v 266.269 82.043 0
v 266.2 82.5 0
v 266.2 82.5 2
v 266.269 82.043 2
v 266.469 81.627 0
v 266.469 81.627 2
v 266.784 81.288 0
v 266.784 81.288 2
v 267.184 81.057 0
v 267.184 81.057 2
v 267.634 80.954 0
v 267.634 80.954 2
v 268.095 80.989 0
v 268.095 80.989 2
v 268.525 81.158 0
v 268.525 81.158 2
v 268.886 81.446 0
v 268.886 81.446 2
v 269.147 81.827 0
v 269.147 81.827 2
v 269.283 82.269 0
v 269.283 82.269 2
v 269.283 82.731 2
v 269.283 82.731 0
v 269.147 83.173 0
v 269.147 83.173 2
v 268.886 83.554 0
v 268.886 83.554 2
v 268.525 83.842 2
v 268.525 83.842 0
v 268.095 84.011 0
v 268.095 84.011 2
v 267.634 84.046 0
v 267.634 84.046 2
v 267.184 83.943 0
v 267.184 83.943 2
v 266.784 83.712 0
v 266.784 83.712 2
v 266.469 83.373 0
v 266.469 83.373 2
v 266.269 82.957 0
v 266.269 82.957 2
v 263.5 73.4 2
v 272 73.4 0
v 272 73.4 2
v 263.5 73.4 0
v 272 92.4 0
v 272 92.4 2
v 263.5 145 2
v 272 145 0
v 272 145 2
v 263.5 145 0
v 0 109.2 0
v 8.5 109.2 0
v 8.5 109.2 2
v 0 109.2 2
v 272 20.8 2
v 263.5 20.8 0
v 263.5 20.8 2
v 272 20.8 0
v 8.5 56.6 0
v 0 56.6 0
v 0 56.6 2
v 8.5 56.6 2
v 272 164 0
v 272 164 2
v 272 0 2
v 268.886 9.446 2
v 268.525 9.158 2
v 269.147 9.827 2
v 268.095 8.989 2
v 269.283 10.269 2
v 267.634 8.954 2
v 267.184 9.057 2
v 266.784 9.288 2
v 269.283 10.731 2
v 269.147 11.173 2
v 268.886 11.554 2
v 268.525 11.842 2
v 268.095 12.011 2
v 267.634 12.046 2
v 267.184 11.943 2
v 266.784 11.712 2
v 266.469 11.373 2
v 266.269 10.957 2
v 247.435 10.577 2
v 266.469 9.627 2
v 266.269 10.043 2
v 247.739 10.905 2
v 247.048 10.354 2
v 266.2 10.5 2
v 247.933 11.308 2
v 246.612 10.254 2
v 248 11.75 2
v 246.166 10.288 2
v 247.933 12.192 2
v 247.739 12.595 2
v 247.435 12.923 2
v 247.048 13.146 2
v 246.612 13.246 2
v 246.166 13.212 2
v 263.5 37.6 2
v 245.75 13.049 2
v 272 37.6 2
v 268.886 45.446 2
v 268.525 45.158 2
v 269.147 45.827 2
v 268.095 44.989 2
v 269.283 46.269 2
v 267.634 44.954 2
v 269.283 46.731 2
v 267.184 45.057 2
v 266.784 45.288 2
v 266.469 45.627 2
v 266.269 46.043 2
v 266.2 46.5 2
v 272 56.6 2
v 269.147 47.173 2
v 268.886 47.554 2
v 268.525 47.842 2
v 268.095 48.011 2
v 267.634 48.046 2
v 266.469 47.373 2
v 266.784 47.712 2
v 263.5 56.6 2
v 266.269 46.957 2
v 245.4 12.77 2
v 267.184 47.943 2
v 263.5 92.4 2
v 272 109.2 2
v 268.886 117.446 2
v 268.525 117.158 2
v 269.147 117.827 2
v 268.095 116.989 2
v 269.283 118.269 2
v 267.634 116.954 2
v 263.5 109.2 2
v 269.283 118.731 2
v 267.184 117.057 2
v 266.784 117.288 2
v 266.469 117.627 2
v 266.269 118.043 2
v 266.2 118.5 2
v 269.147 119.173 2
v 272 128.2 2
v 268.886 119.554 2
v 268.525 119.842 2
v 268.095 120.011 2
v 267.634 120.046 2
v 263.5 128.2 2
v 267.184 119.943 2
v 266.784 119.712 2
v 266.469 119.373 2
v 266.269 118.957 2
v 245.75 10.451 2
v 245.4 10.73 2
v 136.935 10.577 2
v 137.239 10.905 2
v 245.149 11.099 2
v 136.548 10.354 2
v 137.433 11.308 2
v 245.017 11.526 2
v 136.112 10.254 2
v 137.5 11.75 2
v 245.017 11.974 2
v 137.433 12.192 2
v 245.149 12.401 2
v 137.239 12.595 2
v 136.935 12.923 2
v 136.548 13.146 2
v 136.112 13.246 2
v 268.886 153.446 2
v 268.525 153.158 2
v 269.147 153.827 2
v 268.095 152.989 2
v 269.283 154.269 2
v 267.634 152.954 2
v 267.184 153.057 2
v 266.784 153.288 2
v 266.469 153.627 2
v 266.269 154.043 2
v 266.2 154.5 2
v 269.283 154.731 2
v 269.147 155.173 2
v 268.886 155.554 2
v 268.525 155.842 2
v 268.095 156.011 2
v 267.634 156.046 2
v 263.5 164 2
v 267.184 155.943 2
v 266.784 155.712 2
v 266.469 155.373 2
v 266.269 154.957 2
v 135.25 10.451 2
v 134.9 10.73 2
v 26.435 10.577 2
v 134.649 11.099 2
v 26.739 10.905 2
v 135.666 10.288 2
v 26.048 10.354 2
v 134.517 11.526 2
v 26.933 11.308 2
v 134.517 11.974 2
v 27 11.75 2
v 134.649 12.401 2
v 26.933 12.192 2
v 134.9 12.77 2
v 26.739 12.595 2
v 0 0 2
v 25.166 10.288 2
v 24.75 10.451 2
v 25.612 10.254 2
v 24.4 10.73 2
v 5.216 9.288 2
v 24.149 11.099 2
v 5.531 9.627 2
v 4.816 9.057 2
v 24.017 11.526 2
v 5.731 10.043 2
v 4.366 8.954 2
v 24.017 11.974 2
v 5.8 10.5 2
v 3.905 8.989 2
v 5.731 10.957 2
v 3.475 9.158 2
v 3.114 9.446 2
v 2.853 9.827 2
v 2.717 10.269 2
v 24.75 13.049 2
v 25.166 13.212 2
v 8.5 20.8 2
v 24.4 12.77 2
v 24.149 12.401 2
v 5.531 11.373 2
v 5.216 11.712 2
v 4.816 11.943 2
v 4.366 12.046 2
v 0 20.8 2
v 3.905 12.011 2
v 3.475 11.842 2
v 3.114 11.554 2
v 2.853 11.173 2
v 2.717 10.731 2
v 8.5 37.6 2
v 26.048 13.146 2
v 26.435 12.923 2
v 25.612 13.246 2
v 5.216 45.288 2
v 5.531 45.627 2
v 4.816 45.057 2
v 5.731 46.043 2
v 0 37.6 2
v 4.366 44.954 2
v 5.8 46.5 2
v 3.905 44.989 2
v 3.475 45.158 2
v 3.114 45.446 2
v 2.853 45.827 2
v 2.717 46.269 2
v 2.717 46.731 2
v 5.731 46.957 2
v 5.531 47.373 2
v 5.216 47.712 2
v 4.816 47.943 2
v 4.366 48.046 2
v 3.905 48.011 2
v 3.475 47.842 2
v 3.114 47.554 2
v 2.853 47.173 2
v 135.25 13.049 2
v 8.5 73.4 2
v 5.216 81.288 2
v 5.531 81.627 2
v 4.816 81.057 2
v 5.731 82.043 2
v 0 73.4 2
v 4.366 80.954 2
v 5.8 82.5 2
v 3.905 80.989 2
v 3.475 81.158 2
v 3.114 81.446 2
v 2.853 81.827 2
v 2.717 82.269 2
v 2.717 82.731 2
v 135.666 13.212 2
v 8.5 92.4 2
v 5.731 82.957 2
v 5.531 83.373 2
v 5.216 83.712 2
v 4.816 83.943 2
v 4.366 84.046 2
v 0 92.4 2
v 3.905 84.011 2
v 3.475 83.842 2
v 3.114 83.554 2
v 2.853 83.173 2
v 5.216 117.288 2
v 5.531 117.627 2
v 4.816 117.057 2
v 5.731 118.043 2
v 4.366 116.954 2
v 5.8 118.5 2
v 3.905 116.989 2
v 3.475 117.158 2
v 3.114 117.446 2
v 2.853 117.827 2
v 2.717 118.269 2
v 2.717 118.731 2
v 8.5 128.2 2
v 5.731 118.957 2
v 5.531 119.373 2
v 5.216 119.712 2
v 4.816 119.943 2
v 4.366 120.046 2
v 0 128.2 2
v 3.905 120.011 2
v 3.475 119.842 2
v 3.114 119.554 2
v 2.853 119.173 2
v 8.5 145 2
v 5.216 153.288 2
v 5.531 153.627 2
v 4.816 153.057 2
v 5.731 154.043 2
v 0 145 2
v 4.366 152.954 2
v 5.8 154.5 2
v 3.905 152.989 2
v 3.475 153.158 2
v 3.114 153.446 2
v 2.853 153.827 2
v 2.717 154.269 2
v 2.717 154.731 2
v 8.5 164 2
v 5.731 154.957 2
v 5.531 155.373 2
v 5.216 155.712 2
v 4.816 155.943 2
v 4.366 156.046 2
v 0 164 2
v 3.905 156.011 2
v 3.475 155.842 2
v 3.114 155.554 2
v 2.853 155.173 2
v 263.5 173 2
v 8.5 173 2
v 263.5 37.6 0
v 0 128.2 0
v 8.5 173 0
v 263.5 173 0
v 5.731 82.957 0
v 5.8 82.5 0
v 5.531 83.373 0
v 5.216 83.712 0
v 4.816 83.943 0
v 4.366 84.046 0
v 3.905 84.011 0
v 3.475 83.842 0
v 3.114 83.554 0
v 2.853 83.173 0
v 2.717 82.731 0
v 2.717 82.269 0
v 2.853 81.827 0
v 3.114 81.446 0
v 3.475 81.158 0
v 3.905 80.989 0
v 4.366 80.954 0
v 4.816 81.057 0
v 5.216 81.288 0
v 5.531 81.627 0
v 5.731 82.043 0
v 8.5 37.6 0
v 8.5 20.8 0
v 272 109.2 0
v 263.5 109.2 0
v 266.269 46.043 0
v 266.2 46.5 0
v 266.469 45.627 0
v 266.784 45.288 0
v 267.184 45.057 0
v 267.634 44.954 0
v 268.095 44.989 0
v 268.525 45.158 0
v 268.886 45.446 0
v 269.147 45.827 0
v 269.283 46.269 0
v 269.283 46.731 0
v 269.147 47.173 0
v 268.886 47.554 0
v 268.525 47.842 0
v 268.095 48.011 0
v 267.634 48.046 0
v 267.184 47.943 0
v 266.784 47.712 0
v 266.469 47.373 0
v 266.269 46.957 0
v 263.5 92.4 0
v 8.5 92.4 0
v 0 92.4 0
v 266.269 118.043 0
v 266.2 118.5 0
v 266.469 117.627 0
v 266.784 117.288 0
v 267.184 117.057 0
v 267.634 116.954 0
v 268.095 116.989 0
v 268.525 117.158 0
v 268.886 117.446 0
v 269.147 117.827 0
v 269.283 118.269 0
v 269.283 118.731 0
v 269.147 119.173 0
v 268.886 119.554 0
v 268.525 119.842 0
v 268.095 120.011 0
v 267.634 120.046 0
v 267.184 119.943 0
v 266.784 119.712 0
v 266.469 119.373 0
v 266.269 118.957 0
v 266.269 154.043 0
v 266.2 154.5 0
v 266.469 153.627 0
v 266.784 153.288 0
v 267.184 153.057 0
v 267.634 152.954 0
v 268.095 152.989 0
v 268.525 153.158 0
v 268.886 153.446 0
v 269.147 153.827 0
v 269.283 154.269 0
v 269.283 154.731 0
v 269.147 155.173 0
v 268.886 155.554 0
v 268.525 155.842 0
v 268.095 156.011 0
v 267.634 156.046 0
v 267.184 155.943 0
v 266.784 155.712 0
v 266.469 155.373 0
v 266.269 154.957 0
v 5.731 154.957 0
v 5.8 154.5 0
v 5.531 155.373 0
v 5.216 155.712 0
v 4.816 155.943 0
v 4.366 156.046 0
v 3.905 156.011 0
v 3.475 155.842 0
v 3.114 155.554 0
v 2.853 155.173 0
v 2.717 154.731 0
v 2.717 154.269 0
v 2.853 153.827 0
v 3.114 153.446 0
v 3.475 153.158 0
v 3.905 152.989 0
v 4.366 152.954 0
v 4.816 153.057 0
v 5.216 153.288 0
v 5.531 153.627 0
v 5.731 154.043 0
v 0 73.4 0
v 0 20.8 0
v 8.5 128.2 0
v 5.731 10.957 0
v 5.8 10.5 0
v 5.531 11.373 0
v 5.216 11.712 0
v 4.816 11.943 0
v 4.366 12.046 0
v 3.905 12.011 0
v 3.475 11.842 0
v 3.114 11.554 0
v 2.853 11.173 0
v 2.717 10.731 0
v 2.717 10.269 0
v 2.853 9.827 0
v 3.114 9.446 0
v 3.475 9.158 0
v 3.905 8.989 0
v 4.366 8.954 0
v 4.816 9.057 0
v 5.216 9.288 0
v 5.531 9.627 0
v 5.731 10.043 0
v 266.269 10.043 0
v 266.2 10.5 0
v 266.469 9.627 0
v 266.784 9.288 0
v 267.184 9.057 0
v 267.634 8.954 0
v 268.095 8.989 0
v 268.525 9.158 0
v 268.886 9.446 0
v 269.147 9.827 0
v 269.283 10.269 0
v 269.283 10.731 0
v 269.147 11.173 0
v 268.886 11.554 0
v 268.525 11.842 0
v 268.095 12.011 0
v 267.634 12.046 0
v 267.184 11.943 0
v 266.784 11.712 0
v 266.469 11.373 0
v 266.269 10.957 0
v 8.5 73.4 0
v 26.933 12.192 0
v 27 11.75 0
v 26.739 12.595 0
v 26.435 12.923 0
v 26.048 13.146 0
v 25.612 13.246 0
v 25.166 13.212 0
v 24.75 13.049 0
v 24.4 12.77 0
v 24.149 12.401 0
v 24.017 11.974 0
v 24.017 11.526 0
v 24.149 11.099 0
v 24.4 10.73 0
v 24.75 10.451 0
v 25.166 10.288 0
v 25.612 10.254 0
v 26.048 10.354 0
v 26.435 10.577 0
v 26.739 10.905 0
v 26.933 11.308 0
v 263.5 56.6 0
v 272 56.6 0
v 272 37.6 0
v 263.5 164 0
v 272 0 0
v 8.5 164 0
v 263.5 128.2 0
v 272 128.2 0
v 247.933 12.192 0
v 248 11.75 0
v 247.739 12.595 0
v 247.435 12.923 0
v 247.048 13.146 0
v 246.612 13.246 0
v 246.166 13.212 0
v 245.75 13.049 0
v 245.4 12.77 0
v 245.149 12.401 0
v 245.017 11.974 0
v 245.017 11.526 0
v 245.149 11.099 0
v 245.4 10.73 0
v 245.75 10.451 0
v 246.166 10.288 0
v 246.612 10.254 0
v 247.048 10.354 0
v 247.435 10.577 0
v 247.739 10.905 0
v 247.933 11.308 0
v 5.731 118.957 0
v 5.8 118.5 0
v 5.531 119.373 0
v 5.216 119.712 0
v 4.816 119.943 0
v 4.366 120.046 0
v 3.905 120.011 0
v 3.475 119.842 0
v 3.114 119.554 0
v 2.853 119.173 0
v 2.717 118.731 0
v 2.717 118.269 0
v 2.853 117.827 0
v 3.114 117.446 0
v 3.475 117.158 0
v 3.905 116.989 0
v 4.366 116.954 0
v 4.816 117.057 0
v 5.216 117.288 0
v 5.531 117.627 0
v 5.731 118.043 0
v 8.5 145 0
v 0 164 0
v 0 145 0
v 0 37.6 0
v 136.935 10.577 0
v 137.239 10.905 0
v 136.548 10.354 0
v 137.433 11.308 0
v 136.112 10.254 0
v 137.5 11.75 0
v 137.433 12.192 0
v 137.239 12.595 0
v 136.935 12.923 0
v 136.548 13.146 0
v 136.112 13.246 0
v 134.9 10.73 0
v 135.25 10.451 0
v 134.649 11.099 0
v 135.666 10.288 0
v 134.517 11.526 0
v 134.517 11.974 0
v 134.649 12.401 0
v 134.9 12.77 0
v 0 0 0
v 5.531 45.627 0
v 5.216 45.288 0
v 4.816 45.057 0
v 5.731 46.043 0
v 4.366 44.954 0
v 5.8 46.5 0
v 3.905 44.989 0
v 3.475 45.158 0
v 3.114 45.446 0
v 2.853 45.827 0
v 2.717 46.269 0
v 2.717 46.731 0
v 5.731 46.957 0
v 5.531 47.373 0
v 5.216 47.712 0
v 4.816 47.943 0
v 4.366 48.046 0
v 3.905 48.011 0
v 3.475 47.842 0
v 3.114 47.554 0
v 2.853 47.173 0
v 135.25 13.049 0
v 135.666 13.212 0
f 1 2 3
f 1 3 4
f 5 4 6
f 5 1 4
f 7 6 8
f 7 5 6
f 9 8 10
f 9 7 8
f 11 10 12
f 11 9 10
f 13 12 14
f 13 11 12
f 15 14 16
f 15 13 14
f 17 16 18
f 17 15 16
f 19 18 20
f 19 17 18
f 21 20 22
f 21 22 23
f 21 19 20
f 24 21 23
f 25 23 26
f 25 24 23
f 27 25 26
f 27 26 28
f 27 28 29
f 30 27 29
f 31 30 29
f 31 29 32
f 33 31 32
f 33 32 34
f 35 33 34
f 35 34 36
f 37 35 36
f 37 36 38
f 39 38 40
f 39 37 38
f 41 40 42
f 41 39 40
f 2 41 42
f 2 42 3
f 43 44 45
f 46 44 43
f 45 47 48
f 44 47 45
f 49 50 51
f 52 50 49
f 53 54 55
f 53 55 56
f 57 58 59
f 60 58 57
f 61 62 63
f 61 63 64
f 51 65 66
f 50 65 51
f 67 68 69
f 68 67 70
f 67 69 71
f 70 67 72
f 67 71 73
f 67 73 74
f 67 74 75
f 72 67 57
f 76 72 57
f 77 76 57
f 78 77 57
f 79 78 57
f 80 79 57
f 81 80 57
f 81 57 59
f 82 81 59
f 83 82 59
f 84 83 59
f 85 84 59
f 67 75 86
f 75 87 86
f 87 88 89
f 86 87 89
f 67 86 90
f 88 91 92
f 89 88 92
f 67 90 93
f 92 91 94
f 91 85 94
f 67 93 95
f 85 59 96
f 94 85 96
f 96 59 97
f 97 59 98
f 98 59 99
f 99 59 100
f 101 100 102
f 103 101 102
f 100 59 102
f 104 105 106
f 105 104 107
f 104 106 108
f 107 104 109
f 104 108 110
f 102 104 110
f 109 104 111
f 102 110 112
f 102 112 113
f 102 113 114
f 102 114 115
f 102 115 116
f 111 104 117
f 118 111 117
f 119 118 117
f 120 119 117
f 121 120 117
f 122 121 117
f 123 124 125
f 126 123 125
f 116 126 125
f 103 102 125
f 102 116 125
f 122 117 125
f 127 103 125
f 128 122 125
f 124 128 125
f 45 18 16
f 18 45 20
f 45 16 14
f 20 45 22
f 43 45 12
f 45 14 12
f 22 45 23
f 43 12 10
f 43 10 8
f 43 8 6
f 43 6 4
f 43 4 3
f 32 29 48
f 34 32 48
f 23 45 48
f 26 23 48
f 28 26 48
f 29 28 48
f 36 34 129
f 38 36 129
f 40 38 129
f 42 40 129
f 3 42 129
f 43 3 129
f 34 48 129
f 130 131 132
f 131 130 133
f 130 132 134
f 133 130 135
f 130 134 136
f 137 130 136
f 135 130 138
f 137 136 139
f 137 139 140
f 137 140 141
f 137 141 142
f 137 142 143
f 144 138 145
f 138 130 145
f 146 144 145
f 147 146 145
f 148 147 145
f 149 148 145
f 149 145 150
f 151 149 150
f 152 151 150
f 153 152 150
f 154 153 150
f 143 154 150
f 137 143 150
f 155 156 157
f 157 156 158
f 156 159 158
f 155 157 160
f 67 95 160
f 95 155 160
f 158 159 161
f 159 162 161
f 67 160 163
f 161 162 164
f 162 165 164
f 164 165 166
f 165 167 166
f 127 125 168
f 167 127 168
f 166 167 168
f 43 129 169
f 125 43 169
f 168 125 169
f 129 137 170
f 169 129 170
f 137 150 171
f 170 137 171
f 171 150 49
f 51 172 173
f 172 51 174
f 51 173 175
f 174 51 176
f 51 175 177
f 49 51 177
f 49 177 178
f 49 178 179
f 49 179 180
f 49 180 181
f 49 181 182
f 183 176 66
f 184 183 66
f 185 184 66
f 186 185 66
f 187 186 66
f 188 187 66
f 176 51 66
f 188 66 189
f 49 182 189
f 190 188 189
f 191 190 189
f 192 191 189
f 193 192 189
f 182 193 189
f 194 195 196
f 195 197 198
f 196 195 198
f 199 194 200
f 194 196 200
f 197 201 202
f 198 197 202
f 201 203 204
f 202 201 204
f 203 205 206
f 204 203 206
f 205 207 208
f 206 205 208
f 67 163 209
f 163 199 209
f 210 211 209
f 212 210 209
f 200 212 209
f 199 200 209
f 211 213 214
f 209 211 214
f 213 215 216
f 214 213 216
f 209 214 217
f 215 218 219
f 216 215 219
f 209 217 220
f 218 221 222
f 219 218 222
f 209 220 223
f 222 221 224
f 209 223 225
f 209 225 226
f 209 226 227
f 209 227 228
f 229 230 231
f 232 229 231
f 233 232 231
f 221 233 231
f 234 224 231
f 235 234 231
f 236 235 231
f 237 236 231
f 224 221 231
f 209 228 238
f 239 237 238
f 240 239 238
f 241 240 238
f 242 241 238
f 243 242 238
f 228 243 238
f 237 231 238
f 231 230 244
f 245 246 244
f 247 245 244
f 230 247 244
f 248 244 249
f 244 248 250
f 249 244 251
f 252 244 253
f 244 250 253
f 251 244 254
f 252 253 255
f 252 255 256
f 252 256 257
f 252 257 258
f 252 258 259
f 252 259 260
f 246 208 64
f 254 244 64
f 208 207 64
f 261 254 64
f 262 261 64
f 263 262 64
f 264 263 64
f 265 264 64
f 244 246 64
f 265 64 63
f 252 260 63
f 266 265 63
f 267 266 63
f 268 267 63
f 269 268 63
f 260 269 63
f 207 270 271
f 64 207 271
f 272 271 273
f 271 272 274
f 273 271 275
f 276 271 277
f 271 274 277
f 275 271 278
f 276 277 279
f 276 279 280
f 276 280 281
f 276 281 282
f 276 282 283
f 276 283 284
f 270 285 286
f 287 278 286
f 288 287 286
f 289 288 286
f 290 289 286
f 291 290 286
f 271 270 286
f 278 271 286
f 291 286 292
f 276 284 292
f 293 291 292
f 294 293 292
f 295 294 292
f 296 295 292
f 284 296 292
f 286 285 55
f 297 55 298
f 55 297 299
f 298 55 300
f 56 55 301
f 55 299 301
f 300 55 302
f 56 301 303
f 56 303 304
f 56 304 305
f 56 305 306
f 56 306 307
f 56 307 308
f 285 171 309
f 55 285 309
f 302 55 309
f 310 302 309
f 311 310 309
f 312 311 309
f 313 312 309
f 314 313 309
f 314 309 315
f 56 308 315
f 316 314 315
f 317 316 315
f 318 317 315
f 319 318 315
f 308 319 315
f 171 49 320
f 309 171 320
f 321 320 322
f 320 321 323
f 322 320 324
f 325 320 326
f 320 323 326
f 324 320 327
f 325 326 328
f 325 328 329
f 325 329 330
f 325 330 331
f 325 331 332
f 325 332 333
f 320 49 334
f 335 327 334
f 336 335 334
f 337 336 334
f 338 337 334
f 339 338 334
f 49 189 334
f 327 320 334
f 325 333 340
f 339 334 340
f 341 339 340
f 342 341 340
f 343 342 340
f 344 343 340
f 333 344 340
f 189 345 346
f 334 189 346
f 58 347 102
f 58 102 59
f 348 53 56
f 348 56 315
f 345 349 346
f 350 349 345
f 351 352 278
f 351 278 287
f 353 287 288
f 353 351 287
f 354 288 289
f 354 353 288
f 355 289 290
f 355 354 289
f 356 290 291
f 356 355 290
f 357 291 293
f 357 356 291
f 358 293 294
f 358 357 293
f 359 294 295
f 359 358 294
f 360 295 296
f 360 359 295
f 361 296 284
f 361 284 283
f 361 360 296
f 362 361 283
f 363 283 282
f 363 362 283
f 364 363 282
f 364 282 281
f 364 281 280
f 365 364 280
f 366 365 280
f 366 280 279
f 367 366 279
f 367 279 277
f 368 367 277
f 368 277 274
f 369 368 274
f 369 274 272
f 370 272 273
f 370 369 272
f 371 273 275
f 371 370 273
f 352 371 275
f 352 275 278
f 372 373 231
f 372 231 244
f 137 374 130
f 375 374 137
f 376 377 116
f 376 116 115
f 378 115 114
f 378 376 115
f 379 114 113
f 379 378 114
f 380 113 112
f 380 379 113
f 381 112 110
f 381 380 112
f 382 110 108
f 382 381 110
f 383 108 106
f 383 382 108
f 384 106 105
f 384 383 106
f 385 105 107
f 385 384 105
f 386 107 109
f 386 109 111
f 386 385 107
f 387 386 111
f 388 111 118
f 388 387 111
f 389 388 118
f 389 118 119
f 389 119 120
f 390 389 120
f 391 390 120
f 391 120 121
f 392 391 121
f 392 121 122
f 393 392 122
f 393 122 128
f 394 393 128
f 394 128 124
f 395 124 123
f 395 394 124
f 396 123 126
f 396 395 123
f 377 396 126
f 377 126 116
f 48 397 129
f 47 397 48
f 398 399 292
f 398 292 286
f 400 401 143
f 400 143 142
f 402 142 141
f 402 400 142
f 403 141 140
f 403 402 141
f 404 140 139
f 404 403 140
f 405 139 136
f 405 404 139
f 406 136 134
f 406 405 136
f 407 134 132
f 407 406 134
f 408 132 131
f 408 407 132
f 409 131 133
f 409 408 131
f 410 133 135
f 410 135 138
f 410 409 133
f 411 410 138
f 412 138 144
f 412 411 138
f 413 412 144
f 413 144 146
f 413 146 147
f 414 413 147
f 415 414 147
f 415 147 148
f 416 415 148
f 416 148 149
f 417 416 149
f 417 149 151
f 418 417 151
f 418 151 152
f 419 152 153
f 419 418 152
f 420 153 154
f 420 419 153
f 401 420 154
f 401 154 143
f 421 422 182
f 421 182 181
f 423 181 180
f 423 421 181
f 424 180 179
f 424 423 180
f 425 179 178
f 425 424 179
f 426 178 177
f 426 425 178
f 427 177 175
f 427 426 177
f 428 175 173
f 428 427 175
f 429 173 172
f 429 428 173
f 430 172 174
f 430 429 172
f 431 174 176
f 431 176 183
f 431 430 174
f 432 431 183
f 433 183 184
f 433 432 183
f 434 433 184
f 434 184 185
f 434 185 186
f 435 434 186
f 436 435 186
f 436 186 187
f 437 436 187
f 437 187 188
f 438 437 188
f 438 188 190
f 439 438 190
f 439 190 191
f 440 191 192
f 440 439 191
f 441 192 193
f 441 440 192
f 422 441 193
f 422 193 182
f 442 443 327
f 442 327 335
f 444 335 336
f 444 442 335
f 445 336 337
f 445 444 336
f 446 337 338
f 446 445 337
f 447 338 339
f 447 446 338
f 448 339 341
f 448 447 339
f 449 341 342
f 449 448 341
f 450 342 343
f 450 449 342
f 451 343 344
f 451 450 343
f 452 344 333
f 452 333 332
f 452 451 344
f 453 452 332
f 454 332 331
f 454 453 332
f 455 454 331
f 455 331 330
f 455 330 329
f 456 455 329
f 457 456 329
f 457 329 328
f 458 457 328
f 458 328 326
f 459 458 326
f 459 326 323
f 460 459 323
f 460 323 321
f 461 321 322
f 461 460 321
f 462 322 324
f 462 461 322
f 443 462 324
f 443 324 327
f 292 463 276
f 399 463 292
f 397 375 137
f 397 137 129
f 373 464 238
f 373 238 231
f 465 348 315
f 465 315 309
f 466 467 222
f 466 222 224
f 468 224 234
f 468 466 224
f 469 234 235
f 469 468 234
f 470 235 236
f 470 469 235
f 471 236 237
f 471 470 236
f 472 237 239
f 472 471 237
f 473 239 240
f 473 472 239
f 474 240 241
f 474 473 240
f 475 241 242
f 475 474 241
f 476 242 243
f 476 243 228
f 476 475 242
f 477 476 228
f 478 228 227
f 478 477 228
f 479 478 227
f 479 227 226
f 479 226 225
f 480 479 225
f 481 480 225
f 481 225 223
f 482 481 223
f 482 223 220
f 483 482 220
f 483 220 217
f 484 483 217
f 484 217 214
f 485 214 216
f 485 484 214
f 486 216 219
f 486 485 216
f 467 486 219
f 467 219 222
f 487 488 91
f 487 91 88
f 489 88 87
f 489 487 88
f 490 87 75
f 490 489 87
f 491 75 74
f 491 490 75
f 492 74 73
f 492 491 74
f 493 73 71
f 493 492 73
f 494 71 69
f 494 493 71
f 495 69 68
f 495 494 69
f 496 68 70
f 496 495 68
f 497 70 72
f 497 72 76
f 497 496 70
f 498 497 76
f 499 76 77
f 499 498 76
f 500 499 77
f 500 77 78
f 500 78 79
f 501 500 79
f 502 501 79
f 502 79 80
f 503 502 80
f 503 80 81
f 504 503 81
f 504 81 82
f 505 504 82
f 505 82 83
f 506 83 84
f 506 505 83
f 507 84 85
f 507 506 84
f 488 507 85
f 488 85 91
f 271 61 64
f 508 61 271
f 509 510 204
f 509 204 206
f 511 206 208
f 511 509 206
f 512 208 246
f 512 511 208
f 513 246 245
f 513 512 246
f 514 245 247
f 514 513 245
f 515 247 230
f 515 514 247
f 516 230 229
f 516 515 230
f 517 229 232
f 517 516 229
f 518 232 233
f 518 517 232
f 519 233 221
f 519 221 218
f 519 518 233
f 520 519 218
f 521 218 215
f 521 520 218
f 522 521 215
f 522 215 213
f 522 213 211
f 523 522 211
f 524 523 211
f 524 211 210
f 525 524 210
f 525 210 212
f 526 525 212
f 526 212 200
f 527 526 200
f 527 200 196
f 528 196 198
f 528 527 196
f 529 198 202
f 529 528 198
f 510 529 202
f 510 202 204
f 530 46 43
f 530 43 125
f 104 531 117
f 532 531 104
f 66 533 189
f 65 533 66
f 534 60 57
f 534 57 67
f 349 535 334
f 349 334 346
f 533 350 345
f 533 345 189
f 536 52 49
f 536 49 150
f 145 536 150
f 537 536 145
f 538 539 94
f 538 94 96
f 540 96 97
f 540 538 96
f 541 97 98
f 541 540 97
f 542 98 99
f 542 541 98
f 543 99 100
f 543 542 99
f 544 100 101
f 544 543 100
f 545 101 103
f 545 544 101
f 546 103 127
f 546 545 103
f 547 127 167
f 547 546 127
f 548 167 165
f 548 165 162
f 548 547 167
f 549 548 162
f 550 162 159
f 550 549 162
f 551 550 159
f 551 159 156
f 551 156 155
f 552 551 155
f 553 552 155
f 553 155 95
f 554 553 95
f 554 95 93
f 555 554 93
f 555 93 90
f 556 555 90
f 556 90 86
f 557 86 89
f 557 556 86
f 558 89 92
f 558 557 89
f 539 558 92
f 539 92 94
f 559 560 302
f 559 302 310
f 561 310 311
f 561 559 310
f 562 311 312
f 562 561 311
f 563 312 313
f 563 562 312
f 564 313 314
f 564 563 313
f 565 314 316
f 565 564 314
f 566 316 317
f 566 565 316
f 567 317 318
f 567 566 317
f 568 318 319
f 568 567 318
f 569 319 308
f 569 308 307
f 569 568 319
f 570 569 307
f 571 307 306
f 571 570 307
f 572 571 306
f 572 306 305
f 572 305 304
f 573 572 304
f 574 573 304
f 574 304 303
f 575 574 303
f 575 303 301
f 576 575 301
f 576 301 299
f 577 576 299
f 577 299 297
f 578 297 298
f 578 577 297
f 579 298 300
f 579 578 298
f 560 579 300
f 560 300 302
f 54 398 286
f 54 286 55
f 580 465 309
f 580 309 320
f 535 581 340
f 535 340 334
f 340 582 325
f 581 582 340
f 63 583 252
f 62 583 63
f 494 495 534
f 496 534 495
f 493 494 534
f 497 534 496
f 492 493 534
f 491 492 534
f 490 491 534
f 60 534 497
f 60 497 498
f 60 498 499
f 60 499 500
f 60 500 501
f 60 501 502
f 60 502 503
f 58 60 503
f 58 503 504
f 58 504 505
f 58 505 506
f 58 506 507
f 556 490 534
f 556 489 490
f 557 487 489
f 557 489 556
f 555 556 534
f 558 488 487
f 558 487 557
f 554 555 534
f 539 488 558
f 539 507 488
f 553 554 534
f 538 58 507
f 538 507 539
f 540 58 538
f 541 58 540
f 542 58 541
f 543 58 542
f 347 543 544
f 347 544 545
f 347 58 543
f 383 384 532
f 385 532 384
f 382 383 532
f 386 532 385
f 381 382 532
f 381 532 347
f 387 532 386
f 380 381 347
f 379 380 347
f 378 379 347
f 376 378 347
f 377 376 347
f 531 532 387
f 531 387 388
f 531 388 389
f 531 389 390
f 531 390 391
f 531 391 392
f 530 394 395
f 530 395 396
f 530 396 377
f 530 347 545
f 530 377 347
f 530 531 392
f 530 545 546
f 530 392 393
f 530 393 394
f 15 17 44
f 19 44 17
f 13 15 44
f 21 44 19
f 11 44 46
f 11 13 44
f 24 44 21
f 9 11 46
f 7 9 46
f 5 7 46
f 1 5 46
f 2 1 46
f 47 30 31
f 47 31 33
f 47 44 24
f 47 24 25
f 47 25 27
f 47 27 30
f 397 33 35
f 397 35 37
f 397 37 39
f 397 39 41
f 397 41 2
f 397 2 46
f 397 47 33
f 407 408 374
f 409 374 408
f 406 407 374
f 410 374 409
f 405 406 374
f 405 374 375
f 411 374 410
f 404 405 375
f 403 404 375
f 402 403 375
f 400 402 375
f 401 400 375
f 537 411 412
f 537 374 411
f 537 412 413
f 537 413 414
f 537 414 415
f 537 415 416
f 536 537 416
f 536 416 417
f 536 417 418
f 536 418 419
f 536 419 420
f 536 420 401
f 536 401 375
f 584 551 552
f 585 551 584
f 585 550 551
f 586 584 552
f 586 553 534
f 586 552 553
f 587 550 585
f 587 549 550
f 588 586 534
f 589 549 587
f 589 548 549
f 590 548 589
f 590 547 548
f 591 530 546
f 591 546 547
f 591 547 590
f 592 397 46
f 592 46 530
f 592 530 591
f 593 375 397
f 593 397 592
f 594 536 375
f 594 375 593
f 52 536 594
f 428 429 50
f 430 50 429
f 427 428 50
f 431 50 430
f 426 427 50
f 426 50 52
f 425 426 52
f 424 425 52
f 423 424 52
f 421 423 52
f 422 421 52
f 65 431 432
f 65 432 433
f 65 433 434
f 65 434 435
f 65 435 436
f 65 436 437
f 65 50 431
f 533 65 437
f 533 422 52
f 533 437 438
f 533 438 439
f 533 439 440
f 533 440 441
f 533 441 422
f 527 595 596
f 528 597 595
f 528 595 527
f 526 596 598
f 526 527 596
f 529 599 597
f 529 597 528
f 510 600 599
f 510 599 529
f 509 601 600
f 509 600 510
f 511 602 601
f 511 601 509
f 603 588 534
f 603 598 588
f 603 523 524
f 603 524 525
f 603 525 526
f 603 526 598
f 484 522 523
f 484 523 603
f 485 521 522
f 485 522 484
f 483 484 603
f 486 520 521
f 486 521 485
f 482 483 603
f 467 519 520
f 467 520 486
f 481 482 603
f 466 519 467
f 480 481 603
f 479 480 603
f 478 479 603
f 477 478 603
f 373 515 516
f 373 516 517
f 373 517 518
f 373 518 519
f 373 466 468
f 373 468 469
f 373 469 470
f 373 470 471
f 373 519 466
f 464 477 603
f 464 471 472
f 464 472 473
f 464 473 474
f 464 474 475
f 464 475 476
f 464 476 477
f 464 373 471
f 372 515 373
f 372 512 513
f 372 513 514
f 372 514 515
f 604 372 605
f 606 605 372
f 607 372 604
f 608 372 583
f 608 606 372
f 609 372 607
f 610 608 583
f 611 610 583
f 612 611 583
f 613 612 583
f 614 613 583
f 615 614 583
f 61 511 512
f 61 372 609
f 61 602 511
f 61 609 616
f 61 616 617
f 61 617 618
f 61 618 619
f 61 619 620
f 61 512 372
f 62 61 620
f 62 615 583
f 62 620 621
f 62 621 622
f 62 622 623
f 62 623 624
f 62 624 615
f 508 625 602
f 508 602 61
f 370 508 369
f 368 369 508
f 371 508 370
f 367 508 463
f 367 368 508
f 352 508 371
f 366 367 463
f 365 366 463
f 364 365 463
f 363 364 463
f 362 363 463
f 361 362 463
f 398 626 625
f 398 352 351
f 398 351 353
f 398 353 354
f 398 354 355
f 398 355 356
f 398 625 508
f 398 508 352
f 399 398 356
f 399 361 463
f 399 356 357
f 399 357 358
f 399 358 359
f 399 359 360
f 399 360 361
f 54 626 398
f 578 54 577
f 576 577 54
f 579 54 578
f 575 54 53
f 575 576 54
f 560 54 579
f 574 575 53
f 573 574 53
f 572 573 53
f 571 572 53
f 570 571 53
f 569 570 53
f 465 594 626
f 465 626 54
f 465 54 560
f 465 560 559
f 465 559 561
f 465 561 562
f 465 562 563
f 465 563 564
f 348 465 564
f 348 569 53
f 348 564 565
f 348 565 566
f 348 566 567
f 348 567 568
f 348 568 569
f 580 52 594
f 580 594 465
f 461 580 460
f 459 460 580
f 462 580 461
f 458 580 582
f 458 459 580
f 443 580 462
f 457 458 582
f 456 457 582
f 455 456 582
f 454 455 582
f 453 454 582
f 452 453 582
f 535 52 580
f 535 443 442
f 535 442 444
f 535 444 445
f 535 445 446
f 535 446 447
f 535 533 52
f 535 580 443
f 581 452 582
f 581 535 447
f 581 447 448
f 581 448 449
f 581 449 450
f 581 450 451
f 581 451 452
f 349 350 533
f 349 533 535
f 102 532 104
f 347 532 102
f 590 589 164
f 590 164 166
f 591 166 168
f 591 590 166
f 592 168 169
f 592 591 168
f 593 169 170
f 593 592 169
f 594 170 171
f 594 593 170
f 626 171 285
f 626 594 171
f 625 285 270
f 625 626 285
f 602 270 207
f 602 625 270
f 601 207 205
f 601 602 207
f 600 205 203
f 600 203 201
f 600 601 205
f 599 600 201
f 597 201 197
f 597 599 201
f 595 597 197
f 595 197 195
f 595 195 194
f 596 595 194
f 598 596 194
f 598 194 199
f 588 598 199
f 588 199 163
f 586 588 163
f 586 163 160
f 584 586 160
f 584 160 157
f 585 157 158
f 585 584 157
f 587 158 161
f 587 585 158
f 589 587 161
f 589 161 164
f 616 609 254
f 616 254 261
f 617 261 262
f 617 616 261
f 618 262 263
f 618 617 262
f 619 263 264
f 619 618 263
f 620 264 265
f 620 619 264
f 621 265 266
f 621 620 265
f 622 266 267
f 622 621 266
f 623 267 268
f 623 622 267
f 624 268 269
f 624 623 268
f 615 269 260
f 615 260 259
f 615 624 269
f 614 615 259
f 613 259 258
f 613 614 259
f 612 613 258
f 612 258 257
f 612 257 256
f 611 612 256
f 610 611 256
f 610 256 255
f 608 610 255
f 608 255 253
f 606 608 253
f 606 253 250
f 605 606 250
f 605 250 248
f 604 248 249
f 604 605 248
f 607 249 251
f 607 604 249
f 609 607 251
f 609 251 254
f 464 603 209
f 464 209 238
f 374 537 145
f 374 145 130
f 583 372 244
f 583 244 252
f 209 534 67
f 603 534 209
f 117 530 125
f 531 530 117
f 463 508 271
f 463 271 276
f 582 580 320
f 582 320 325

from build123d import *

# Parameters (mm, degrees)
SKETCH1_R           = 1.55
SKETCH1_R_2         = 1.5
BOSS_EXTRUDE1_DEPTH = 2


with BuildPart() as part:
    # Sketch1 → Boss-Extrude1 (new body)
    with BuildSketch(Plane.XY):
        Polygon((0, 20.8), (8.5, 20.8), (8.5, 37.6), (0, 37.6), (0, 56.6), (8.5, 56.6), (8.5, 73.4), (0, 73.4), (0, 92.4), (8.5, 92.4), (8.5, 109.2), (0, 109.2), (0, 128.2), (8.5, 128.2), (8.5, 145), (0, 145), (0, 164), (8.5, 164), (8.5, 173), (263.5, 173), (263.5, 164), (272, 164), (272, 145), (263.5, 145), (263.5, 128.2), (272, 128.2), (272, 109.2), (263.5, 109.2), (263.5, 92.4), (272, 92.4), (272, 73.4), (263.5, 73.4), (263.5, 56.6), (272, 56.6), (272, 37.6), (263.5, 37.6), (263.5, 20.8), (272, 20.8), (272, 0), (0, 0), align=None)
        with Locations((4.25, 154.5)):
            Circle(SKETCH1_R, mode=Mode.SUBTRACT)
        with Locations((4.25, 118.5)):
            Circle(SKETCH1_R, mode=Mode.SUBTRACT)
        with Locations((4.25, 82.5)):
            Circle(SKETCH1_R, mode=Mode.SUBTRACT)
        with Locations((4.25, 46.5)):
            Circle(SKETCH1_R, mode=Mode.SUBTRACT)
        with Locations((4.25, 10.5)):
            Circle(SKETCH1_R, mode=Mode.SUBTRACT)
        with Locations(Location((267.75, 10.5, 0), (0, 0, 180))):
            Circle(SKETCH1_R, mode=Mode.SUBTRACT)
        with Locations(Location((267.75, 46.5, 0), (0, 0, 180))):
            Circle(SKETCH1_R, mode=Mode.SUBTRACT)
        with Locations(Location((267.75, 82.5, 0), (0, 0, 180))):
            Circle(SKETCH1_R, mode=Mode.SUBTRACT)
        with Locations(Location((267.75, 118.5, 0), (0, 0, 180))):
            Circle(SKETCH1_R, mode=Mode.SUBTRACT)
        with Locations(Location((267.75, 154.5, 0), (0, 0, 180))):
            Circle(SKETCH1_R, mode=Mode.SUBTRACT)
        with Locations((25.5, 11.75)):
            Circle(SKETCH1_R_2, mode=Mode.SUBTRACT)
        with Locations((136, 11.75)):
            Circle(SKETCH1_R_2, mode=Mode.SUBTRACT)
        with Locations((246.5, 11.75)):
            Circle(SKETCH1_R_2, mode=Mode.SUBTRACT)
    extrude(amount=BOSS_EXTRUDE1_DEPTH)


solid = part.part
